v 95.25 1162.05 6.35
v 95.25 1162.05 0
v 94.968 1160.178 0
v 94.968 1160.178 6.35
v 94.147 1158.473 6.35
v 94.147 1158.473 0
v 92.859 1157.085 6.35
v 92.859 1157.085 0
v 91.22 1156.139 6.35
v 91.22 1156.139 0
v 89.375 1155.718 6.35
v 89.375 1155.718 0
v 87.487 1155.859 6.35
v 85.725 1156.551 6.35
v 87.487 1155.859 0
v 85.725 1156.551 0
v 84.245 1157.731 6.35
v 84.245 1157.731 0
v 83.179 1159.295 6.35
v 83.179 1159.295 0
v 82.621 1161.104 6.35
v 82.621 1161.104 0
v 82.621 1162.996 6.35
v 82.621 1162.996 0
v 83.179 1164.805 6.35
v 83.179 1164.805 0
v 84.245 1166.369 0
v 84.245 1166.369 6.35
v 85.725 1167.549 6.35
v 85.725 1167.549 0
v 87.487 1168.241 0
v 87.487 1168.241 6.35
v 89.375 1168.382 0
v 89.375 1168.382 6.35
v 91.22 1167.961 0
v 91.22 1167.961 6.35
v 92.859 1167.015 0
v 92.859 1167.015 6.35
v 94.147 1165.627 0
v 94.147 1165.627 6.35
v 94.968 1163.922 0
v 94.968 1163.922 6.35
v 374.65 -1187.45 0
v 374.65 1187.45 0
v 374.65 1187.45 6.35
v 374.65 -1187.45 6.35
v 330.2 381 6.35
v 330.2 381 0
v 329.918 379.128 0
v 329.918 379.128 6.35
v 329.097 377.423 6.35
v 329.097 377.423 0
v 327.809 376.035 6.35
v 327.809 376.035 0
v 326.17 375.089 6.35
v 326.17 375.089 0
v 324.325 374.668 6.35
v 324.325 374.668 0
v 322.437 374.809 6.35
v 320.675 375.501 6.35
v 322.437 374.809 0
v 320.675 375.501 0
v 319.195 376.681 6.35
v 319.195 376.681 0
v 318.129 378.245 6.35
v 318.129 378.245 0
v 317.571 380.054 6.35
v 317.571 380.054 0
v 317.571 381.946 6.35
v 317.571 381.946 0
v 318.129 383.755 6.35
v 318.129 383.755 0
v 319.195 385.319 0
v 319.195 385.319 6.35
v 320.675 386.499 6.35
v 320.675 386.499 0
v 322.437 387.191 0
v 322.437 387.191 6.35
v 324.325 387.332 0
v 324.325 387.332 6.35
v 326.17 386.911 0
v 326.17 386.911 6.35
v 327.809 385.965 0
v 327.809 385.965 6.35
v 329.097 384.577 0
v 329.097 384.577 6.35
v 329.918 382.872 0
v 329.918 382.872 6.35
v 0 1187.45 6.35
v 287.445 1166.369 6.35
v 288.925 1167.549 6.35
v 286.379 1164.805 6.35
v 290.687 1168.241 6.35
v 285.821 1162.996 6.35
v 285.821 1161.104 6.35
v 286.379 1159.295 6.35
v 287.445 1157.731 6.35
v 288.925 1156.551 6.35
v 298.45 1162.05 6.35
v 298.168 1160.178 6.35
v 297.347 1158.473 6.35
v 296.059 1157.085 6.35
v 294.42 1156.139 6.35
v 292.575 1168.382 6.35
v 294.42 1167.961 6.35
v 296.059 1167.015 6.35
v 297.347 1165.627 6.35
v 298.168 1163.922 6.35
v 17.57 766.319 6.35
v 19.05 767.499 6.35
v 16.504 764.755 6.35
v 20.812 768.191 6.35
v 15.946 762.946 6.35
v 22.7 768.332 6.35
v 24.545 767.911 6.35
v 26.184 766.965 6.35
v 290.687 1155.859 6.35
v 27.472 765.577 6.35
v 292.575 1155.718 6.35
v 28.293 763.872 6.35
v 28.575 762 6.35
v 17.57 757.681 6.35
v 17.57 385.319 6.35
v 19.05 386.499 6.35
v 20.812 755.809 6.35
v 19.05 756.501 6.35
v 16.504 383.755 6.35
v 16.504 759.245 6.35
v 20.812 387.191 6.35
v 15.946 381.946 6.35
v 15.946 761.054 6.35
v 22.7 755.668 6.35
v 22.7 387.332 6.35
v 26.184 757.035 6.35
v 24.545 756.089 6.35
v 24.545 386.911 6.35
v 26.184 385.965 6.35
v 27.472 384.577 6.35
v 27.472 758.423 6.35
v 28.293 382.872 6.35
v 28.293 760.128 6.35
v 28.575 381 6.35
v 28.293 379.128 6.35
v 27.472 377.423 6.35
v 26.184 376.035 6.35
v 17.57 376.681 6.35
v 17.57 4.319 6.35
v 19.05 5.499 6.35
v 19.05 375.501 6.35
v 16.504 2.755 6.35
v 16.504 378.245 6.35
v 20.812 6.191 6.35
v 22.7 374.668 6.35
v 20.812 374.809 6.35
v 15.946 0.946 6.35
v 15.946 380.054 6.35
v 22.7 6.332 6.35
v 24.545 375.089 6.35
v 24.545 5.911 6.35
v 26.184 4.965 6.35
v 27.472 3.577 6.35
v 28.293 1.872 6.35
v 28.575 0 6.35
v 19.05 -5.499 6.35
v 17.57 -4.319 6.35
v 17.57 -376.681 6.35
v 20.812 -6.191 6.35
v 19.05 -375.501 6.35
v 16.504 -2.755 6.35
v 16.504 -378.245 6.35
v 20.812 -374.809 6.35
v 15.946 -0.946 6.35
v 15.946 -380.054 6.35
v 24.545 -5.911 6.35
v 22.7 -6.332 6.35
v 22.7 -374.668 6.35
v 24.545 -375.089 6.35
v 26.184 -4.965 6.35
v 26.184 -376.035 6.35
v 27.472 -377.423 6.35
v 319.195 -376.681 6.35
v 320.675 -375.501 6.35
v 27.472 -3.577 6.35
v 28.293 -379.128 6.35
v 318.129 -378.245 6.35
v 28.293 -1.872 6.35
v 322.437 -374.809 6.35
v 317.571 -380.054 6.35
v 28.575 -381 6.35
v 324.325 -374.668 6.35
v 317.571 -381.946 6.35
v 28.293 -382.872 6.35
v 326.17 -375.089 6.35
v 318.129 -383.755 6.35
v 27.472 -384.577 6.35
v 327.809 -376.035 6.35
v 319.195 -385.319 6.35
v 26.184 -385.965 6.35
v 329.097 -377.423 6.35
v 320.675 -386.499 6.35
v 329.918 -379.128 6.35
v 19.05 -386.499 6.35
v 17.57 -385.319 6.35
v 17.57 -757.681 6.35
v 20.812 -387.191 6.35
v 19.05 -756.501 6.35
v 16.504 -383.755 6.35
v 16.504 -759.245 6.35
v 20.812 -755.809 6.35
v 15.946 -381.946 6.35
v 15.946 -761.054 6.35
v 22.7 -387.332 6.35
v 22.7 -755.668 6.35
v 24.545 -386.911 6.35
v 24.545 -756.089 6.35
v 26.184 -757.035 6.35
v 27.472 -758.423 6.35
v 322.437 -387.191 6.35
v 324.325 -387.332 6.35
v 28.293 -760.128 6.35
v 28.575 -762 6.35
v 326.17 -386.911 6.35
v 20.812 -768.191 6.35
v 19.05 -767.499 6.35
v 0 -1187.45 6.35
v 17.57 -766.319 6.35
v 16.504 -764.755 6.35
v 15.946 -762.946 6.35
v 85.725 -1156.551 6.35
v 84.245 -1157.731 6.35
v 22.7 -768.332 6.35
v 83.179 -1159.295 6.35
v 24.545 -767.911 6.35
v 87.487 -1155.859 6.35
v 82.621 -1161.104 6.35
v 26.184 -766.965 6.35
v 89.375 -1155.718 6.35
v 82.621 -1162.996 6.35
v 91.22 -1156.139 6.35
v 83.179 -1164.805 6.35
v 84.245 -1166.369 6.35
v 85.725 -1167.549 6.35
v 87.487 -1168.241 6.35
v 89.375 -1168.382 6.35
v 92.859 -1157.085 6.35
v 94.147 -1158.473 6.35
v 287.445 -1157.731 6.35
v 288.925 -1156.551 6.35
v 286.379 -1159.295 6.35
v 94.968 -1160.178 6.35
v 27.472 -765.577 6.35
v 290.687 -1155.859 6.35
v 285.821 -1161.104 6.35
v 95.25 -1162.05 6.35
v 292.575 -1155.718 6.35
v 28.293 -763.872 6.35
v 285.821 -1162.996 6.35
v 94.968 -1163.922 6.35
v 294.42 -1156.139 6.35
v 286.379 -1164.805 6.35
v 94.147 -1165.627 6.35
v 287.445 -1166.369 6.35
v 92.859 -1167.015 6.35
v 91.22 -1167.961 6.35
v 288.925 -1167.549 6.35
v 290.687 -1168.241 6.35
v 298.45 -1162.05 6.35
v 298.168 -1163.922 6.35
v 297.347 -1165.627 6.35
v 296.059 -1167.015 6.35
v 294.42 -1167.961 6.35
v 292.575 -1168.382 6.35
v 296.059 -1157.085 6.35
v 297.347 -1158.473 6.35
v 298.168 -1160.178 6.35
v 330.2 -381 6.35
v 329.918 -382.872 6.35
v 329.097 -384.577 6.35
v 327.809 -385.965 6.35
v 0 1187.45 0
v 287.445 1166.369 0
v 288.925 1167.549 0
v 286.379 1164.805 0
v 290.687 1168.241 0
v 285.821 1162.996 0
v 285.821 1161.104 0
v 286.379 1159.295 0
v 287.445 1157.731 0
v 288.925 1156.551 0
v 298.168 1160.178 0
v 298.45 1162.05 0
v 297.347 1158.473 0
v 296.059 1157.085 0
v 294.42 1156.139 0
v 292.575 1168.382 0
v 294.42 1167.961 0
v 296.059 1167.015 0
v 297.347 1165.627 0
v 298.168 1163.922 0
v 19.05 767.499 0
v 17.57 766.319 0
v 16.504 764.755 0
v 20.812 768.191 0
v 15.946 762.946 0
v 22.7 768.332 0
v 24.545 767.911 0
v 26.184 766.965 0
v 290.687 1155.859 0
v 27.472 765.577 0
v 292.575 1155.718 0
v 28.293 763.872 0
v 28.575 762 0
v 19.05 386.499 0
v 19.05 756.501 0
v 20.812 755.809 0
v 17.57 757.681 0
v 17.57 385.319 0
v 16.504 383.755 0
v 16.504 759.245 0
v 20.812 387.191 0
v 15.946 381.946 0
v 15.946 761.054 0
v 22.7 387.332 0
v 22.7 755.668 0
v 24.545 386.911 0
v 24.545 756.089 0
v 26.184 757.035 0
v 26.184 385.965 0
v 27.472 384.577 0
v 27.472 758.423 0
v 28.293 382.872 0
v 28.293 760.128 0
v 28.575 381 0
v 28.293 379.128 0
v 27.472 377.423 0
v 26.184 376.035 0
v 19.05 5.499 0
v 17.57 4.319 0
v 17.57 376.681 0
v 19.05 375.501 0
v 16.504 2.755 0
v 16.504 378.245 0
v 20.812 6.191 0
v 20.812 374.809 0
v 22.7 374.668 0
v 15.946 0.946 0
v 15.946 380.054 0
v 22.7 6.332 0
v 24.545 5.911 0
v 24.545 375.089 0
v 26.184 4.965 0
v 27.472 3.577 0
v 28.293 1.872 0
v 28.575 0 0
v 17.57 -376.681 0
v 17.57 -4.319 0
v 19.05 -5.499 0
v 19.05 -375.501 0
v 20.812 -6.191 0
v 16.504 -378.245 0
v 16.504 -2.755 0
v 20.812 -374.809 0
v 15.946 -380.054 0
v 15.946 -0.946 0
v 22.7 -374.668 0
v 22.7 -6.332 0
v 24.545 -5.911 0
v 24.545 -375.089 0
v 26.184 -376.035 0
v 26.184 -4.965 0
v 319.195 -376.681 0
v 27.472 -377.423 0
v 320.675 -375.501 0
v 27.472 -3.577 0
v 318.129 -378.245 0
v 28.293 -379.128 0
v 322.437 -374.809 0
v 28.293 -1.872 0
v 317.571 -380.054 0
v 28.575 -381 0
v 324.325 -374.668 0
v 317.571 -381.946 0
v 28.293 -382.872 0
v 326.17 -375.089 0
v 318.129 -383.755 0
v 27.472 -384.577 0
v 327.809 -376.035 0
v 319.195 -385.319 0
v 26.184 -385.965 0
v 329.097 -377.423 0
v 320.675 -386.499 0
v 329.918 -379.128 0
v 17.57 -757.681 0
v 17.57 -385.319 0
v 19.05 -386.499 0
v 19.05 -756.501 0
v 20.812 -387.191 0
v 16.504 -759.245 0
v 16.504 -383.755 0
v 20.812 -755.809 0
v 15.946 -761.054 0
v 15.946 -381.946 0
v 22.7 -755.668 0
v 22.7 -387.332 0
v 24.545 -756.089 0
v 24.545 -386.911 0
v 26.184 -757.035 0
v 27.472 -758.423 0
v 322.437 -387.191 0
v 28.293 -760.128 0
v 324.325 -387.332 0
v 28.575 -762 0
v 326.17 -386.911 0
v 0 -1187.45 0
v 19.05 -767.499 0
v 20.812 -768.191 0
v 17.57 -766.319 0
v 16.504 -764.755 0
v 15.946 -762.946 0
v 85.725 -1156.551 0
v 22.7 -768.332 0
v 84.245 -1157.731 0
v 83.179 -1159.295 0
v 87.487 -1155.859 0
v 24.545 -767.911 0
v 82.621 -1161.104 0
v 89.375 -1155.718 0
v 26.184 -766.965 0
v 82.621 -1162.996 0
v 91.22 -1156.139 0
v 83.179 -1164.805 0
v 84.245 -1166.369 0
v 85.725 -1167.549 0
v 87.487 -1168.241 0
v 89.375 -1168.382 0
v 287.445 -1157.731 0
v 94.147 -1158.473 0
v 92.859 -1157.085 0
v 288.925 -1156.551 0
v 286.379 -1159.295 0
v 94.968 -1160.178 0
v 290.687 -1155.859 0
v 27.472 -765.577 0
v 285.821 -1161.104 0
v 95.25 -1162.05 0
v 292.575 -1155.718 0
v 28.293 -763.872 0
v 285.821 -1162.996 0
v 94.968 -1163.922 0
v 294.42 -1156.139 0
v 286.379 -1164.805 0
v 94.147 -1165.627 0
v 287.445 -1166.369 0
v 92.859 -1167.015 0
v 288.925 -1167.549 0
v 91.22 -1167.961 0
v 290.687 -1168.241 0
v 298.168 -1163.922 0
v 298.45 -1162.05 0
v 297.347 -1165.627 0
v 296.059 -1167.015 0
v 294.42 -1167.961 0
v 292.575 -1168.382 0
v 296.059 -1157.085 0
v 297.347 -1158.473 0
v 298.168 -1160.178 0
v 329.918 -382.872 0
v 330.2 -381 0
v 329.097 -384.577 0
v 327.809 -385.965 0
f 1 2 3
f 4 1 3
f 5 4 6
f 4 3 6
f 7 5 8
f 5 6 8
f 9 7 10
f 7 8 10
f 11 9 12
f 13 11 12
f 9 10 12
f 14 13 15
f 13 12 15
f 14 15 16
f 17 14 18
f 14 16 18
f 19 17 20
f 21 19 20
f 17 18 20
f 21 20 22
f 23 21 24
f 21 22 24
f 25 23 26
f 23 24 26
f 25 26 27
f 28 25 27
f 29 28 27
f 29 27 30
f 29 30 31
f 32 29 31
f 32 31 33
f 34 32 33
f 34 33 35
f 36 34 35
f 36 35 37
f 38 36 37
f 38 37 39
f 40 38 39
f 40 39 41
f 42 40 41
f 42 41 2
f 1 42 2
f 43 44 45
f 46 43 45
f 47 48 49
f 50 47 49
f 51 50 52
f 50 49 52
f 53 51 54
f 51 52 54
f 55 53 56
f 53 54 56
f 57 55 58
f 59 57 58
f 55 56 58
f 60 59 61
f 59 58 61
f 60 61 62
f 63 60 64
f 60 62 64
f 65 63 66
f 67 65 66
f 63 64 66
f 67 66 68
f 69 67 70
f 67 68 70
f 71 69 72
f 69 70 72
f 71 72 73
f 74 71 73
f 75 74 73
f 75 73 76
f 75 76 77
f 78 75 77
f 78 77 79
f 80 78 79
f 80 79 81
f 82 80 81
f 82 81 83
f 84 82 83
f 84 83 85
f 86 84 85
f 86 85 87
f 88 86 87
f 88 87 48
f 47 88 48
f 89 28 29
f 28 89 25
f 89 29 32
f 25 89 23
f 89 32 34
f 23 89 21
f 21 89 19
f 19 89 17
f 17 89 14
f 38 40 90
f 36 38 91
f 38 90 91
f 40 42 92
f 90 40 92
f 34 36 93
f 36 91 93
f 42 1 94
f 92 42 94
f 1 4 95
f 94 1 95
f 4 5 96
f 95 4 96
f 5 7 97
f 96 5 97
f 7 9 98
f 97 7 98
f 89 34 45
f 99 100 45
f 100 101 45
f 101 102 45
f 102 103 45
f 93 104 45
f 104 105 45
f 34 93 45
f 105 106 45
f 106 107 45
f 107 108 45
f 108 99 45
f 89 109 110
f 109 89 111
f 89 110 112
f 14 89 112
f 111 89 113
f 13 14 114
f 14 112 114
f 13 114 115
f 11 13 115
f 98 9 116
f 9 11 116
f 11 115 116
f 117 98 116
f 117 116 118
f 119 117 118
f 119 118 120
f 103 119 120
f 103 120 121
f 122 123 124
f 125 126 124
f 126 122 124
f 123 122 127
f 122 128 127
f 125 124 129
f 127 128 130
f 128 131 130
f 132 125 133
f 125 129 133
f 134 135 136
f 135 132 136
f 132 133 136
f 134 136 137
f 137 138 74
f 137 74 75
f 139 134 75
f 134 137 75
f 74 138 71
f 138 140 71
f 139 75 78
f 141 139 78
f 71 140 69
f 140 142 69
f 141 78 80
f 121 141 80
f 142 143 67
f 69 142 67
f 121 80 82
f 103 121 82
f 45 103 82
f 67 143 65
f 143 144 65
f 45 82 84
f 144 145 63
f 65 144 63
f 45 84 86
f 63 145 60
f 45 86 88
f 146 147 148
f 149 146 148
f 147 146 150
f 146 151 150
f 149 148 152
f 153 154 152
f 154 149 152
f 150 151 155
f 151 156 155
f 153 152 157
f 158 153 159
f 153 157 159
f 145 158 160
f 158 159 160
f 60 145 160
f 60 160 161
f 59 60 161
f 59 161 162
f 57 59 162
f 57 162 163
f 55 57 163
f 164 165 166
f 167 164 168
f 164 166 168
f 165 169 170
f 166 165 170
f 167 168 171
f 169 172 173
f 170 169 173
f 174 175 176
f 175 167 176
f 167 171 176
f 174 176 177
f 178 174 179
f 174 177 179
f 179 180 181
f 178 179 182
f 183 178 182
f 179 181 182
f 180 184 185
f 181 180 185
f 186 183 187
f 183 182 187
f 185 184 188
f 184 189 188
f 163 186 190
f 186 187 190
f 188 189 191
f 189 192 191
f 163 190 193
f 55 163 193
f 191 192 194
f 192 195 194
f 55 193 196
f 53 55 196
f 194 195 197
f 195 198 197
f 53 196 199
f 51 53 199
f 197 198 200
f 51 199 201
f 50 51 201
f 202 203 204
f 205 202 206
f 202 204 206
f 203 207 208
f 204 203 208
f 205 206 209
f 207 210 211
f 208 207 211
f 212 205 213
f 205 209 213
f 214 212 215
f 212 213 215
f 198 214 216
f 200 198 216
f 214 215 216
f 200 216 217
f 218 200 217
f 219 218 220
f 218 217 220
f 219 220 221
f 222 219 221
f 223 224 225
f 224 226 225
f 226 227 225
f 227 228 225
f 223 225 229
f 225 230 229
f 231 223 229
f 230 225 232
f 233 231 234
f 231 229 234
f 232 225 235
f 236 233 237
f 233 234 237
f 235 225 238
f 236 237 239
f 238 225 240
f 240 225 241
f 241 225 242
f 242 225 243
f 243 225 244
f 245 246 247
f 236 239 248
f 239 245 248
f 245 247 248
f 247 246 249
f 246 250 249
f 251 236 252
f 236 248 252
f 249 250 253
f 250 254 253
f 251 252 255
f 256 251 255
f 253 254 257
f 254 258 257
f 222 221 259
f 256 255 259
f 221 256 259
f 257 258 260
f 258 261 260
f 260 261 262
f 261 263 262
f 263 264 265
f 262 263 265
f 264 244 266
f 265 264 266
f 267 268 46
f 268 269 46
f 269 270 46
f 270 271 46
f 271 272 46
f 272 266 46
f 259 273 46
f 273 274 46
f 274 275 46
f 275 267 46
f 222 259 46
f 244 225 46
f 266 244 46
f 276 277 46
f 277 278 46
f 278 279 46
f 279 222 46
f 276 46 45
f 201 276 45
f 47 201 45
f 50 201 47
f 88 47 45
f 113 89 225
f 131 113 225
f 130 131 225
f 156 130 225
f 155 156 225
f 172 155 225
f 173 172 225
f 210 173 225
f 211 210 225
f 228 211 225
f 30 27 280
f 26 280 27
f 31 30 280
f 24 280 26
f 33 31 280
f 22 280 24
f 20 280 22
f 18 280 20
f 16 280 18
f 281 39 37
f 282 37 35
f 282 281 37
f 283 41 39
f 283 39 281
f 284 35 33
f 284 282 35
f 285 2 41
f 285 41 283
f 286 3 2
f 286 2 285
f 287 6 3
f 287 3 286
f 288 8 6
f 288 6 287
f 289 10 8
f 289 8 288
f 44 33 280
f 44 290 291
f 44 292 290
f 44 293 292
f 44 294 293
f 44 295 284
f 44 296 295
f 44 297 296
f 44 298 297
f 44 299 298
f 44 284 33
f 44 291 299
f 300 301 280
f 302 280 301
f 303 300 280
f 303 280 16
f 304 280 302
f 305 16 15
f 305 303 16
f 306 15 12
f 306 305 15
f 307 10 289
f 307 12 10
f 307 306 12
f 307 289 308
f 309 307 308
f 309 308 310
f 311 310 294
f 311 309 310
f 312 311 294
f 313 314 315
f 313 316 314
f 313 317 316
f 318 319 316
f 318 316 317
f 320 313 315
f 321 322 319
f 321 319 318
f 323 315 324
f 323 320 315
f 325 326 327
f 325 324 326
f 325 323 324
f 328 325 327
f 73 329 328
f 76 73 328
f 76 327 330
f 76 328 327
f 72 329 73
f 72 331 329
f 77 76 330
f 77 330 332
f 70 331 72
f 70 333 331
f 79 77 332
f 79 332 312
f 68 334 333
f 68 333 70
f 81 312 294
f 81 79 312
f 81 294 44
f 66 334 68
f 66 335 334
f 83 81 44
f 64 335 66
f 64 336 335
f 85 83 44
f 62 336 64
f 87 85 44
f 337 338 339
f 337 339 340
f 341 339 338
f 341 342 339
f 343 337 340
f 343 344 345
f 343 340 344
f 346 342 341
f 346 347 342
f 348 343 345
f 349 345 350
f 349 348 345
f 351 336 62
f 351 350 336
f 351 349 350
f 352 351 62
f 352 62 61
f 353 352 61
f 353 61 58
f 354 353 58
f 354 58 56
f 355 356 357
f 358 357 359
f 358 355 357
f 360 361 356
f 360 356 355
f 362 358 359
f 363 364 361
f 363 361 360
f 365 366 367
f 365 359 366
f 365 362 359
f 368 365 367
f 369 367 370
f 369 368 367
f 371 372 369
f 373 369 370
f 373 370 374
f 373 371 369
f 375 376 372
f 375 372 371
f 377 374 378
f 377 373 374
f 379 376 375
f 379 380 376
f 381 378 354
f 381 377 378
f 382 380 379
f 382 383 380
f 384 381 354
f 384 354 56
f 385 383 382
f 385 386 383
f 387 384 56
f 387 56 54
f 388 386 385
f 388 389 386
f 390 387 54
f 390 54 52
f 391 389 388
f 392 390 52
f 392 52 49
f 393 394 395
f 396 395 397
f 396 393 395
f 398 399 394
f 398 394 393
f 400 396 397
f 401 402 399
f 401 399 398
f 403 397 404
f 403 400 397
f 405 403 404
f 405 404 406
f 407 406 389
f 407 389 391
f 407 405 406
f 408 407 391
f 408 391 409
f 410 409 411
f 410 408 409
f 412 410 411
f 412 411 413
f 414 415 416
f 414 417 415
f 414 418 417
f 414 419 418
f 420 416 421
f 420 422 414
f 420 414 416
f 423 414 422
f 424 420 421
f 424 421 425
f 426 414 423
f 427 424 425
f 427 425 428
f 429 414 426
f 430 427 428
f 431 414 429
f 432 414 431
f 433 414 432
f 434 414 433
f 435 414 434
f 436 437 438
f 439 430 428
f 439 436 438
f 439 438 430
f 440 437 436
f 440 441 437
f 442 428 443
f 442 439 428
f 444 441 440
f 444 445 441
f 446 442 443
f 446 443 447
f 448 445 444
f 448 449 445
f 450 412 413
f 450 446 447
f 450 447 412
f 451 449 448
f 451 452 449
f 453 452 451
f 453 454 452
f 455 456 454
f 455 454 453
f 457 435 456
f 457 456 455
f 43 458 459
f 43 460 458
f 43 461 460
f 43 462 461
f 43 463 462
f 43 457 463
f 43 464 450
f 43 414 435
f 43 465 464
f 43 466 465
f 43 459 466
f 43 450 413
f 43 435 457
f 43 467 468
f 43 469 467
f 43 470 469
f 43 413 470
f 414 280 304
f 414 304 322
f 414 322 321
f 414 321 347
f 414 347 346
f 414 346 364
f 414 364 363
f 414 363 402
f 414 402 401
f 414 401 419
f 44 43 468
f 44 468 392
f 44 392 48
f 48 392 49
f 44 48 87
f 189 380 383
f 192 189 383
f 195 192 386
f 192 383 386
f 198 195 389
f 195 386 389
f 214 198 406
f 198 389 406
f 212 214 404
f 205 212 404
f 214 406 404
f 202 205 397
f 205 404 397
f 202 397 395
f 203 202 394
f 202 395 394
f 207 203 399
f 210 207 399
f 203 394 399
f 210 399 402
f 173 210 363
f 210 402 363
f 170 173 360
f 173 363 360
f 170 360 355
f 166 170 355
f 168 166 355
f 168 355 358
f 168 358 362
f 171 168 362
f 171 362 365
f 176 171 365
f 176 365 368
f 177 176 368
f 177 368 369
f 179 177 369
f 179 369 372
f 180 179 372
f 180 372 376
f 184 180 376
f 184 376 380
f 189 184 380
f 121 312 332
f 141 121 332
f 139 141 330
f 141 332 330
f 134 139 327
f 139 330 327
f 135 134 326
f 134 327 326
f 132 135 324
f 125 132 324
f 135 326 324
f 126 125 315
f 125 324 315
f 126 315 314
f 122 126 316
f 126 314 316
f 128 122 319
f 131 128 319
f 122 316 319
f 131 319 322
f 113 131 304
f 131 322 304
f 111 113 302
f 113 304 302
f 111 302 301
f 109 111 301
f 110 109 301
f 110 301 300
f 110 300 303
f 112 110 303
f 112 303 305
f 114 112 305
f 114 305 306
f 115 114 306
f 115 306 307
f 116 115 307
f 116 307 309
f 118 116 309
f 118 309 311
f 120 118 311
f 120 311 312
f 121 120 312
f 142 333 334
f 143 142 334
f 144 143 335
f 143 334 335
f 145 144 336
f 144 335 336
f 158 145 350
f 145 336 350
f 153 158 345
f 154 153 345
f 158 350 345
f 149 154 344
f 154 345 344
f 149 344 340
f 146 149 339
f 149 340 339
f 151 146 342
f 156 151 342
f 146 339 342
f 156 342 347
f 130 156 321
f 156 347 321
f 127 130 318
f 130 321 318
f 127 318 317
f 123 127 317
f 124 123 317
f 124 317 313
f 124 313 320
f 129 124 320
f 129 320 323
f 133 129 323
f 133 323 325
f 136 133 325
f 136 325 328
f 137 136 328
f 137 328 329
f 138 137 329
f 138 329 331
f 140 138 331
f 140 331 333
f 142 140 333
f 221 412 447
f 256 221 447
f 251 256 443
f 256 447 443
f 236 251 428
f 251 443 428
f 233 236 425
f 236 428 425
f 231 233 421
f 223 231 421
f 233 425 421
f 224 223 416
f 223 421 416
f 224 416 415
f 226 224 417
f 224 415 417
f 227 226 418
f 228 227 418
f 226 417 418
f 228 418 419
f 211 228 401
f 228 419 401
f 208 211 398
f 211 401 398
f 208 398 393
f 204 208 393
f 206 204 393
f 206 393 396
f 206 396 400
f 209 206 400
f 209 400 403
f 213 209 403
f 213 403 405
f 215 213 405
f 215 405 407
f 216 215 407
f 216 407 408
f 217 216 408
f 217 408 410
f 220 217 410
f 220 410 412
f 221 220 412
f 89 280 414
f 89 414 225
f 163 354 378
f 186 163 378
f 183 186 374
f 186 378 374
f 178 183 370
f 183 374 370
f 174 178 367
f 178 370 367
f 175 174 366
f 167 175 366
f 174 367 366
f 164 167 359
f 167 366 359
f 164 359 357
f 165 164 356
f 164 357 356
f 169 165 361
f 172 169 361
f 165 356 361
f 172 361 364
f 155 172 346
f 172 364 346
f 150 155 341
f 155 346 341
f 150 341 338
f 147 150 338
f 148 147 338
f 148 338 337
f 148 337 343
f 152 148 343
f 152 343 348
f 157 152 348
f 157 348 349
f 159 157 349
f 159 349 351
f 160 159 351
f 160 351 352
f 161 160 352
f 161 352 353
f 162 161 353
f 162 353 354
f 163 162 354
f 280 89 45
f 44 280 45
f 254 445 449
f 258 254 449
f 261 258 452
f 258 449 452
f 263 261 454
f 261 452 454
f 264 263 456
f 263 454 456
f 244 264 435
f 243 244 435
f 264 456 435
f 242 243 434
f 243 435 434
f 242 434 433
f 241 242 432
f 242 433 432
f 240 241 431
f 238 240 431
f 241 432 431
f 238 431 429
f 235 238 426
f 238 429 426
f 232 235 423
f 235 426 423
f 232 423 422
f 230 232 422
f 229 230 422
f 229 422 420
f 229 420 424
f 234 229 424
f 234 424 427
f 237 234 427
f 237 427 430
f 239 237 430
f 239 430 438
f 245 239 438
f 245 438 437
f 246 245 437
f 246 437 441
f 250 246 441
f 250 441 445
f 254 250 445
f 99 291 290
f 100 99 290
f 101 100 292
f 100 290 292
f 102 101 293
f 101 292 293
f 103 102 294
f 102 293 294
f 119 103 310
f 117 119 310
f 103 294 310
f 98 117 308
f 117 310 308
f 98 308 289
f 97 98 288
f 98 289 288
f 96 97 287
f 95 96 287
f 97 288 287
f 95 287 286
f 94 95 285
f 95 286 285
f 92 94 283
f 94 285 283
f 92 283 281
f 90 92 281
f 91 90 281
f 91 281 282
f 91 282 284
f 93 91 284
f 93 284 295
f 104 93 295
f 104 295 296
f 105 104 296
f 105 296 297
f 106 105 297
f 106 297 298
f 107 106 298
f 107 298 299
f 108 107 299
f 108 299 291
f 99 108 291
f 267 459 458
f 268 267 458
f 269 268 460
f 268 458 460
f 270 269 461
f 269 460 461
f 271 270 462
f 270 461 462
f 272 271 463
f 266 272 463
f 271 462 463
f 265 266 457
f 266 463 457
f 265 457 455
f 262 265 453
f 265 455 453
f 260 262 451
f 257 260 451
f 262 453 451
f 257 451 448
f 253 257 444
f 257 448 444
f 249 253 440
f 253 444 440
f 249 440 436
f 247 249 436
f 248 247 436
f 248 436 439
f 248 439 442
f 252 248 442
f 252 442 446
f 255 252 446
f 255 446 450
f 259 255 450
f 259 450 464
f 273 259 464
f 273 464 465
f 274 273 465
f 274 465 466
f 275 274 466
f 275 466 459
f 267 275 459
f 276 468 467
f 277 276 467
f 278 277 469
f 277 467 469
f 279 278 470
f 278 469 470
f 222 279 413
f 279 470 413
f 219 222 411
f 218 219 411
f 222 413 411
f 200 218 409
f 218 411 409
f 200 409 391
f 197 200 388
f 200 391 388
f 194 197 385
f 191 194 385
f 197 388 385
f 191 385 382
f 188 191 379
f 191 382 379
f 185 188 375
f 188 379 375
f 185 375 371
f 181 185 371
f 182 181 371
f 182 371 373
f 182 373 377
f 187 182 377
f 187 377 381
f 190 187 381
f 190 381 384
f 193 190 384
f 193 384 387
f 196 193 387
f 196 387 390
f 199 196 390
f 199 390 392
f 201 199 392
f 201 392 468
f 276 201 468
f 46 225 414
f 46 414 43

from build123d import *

# Parameters (mm, degrees)
F0_W     = 374.65
F0_H     = 6.35
F1_DEPTH = 1187.45
F2_R     = 6.35
F3_DEPTH = 6.351


with BuildPart() as f1:
    # F0 (on Front) → F1 (new body, symmetric)
    with BuildSketch(Plane.XZ):
        with Locations((187.325, 3.175)):
            Rectangle(F0_W, F0_H)
    extrude(amount=F1_DEPTH, both=True)

    # F2 (on face) → F3 (cut, through all)
    with BuildSketch(Plane(origin=(0, 0, 0), x_dir=(1, 0, 0), z_dir=(0, 0, -1))):
        with Locations((292.1, 1162.05)):
            Circle(F2_R)
        with Locations((88.9, 1162.05)):
            Circle(F2_R)
        with Locations((292.1, -1162.05)):
            Circle(F2_R)
        with Locations((88.9, -1162.05)):
            Circle(F2_R)
        with Locations((22.225, 381)):
            Circle(F2_R)
        with Locations((22.225, -381)):
            Circle(F2_R)
        with Locations((22.225, 762)):
            Circle(F2_R)
        with Locations((22.225, 0)):
            Circle(F2_R)
        with Locations((22.225, -762)):
            Circle(F2_R)
        with Locations((323.85, 381)):
            Circle(F2_R)
        with Locations((323.85, -381)):
            Circle(F2_R)
    extrude(amount=-F3_DEPTH, mode=Mode.SUBTRACT)


solid = f1.part
